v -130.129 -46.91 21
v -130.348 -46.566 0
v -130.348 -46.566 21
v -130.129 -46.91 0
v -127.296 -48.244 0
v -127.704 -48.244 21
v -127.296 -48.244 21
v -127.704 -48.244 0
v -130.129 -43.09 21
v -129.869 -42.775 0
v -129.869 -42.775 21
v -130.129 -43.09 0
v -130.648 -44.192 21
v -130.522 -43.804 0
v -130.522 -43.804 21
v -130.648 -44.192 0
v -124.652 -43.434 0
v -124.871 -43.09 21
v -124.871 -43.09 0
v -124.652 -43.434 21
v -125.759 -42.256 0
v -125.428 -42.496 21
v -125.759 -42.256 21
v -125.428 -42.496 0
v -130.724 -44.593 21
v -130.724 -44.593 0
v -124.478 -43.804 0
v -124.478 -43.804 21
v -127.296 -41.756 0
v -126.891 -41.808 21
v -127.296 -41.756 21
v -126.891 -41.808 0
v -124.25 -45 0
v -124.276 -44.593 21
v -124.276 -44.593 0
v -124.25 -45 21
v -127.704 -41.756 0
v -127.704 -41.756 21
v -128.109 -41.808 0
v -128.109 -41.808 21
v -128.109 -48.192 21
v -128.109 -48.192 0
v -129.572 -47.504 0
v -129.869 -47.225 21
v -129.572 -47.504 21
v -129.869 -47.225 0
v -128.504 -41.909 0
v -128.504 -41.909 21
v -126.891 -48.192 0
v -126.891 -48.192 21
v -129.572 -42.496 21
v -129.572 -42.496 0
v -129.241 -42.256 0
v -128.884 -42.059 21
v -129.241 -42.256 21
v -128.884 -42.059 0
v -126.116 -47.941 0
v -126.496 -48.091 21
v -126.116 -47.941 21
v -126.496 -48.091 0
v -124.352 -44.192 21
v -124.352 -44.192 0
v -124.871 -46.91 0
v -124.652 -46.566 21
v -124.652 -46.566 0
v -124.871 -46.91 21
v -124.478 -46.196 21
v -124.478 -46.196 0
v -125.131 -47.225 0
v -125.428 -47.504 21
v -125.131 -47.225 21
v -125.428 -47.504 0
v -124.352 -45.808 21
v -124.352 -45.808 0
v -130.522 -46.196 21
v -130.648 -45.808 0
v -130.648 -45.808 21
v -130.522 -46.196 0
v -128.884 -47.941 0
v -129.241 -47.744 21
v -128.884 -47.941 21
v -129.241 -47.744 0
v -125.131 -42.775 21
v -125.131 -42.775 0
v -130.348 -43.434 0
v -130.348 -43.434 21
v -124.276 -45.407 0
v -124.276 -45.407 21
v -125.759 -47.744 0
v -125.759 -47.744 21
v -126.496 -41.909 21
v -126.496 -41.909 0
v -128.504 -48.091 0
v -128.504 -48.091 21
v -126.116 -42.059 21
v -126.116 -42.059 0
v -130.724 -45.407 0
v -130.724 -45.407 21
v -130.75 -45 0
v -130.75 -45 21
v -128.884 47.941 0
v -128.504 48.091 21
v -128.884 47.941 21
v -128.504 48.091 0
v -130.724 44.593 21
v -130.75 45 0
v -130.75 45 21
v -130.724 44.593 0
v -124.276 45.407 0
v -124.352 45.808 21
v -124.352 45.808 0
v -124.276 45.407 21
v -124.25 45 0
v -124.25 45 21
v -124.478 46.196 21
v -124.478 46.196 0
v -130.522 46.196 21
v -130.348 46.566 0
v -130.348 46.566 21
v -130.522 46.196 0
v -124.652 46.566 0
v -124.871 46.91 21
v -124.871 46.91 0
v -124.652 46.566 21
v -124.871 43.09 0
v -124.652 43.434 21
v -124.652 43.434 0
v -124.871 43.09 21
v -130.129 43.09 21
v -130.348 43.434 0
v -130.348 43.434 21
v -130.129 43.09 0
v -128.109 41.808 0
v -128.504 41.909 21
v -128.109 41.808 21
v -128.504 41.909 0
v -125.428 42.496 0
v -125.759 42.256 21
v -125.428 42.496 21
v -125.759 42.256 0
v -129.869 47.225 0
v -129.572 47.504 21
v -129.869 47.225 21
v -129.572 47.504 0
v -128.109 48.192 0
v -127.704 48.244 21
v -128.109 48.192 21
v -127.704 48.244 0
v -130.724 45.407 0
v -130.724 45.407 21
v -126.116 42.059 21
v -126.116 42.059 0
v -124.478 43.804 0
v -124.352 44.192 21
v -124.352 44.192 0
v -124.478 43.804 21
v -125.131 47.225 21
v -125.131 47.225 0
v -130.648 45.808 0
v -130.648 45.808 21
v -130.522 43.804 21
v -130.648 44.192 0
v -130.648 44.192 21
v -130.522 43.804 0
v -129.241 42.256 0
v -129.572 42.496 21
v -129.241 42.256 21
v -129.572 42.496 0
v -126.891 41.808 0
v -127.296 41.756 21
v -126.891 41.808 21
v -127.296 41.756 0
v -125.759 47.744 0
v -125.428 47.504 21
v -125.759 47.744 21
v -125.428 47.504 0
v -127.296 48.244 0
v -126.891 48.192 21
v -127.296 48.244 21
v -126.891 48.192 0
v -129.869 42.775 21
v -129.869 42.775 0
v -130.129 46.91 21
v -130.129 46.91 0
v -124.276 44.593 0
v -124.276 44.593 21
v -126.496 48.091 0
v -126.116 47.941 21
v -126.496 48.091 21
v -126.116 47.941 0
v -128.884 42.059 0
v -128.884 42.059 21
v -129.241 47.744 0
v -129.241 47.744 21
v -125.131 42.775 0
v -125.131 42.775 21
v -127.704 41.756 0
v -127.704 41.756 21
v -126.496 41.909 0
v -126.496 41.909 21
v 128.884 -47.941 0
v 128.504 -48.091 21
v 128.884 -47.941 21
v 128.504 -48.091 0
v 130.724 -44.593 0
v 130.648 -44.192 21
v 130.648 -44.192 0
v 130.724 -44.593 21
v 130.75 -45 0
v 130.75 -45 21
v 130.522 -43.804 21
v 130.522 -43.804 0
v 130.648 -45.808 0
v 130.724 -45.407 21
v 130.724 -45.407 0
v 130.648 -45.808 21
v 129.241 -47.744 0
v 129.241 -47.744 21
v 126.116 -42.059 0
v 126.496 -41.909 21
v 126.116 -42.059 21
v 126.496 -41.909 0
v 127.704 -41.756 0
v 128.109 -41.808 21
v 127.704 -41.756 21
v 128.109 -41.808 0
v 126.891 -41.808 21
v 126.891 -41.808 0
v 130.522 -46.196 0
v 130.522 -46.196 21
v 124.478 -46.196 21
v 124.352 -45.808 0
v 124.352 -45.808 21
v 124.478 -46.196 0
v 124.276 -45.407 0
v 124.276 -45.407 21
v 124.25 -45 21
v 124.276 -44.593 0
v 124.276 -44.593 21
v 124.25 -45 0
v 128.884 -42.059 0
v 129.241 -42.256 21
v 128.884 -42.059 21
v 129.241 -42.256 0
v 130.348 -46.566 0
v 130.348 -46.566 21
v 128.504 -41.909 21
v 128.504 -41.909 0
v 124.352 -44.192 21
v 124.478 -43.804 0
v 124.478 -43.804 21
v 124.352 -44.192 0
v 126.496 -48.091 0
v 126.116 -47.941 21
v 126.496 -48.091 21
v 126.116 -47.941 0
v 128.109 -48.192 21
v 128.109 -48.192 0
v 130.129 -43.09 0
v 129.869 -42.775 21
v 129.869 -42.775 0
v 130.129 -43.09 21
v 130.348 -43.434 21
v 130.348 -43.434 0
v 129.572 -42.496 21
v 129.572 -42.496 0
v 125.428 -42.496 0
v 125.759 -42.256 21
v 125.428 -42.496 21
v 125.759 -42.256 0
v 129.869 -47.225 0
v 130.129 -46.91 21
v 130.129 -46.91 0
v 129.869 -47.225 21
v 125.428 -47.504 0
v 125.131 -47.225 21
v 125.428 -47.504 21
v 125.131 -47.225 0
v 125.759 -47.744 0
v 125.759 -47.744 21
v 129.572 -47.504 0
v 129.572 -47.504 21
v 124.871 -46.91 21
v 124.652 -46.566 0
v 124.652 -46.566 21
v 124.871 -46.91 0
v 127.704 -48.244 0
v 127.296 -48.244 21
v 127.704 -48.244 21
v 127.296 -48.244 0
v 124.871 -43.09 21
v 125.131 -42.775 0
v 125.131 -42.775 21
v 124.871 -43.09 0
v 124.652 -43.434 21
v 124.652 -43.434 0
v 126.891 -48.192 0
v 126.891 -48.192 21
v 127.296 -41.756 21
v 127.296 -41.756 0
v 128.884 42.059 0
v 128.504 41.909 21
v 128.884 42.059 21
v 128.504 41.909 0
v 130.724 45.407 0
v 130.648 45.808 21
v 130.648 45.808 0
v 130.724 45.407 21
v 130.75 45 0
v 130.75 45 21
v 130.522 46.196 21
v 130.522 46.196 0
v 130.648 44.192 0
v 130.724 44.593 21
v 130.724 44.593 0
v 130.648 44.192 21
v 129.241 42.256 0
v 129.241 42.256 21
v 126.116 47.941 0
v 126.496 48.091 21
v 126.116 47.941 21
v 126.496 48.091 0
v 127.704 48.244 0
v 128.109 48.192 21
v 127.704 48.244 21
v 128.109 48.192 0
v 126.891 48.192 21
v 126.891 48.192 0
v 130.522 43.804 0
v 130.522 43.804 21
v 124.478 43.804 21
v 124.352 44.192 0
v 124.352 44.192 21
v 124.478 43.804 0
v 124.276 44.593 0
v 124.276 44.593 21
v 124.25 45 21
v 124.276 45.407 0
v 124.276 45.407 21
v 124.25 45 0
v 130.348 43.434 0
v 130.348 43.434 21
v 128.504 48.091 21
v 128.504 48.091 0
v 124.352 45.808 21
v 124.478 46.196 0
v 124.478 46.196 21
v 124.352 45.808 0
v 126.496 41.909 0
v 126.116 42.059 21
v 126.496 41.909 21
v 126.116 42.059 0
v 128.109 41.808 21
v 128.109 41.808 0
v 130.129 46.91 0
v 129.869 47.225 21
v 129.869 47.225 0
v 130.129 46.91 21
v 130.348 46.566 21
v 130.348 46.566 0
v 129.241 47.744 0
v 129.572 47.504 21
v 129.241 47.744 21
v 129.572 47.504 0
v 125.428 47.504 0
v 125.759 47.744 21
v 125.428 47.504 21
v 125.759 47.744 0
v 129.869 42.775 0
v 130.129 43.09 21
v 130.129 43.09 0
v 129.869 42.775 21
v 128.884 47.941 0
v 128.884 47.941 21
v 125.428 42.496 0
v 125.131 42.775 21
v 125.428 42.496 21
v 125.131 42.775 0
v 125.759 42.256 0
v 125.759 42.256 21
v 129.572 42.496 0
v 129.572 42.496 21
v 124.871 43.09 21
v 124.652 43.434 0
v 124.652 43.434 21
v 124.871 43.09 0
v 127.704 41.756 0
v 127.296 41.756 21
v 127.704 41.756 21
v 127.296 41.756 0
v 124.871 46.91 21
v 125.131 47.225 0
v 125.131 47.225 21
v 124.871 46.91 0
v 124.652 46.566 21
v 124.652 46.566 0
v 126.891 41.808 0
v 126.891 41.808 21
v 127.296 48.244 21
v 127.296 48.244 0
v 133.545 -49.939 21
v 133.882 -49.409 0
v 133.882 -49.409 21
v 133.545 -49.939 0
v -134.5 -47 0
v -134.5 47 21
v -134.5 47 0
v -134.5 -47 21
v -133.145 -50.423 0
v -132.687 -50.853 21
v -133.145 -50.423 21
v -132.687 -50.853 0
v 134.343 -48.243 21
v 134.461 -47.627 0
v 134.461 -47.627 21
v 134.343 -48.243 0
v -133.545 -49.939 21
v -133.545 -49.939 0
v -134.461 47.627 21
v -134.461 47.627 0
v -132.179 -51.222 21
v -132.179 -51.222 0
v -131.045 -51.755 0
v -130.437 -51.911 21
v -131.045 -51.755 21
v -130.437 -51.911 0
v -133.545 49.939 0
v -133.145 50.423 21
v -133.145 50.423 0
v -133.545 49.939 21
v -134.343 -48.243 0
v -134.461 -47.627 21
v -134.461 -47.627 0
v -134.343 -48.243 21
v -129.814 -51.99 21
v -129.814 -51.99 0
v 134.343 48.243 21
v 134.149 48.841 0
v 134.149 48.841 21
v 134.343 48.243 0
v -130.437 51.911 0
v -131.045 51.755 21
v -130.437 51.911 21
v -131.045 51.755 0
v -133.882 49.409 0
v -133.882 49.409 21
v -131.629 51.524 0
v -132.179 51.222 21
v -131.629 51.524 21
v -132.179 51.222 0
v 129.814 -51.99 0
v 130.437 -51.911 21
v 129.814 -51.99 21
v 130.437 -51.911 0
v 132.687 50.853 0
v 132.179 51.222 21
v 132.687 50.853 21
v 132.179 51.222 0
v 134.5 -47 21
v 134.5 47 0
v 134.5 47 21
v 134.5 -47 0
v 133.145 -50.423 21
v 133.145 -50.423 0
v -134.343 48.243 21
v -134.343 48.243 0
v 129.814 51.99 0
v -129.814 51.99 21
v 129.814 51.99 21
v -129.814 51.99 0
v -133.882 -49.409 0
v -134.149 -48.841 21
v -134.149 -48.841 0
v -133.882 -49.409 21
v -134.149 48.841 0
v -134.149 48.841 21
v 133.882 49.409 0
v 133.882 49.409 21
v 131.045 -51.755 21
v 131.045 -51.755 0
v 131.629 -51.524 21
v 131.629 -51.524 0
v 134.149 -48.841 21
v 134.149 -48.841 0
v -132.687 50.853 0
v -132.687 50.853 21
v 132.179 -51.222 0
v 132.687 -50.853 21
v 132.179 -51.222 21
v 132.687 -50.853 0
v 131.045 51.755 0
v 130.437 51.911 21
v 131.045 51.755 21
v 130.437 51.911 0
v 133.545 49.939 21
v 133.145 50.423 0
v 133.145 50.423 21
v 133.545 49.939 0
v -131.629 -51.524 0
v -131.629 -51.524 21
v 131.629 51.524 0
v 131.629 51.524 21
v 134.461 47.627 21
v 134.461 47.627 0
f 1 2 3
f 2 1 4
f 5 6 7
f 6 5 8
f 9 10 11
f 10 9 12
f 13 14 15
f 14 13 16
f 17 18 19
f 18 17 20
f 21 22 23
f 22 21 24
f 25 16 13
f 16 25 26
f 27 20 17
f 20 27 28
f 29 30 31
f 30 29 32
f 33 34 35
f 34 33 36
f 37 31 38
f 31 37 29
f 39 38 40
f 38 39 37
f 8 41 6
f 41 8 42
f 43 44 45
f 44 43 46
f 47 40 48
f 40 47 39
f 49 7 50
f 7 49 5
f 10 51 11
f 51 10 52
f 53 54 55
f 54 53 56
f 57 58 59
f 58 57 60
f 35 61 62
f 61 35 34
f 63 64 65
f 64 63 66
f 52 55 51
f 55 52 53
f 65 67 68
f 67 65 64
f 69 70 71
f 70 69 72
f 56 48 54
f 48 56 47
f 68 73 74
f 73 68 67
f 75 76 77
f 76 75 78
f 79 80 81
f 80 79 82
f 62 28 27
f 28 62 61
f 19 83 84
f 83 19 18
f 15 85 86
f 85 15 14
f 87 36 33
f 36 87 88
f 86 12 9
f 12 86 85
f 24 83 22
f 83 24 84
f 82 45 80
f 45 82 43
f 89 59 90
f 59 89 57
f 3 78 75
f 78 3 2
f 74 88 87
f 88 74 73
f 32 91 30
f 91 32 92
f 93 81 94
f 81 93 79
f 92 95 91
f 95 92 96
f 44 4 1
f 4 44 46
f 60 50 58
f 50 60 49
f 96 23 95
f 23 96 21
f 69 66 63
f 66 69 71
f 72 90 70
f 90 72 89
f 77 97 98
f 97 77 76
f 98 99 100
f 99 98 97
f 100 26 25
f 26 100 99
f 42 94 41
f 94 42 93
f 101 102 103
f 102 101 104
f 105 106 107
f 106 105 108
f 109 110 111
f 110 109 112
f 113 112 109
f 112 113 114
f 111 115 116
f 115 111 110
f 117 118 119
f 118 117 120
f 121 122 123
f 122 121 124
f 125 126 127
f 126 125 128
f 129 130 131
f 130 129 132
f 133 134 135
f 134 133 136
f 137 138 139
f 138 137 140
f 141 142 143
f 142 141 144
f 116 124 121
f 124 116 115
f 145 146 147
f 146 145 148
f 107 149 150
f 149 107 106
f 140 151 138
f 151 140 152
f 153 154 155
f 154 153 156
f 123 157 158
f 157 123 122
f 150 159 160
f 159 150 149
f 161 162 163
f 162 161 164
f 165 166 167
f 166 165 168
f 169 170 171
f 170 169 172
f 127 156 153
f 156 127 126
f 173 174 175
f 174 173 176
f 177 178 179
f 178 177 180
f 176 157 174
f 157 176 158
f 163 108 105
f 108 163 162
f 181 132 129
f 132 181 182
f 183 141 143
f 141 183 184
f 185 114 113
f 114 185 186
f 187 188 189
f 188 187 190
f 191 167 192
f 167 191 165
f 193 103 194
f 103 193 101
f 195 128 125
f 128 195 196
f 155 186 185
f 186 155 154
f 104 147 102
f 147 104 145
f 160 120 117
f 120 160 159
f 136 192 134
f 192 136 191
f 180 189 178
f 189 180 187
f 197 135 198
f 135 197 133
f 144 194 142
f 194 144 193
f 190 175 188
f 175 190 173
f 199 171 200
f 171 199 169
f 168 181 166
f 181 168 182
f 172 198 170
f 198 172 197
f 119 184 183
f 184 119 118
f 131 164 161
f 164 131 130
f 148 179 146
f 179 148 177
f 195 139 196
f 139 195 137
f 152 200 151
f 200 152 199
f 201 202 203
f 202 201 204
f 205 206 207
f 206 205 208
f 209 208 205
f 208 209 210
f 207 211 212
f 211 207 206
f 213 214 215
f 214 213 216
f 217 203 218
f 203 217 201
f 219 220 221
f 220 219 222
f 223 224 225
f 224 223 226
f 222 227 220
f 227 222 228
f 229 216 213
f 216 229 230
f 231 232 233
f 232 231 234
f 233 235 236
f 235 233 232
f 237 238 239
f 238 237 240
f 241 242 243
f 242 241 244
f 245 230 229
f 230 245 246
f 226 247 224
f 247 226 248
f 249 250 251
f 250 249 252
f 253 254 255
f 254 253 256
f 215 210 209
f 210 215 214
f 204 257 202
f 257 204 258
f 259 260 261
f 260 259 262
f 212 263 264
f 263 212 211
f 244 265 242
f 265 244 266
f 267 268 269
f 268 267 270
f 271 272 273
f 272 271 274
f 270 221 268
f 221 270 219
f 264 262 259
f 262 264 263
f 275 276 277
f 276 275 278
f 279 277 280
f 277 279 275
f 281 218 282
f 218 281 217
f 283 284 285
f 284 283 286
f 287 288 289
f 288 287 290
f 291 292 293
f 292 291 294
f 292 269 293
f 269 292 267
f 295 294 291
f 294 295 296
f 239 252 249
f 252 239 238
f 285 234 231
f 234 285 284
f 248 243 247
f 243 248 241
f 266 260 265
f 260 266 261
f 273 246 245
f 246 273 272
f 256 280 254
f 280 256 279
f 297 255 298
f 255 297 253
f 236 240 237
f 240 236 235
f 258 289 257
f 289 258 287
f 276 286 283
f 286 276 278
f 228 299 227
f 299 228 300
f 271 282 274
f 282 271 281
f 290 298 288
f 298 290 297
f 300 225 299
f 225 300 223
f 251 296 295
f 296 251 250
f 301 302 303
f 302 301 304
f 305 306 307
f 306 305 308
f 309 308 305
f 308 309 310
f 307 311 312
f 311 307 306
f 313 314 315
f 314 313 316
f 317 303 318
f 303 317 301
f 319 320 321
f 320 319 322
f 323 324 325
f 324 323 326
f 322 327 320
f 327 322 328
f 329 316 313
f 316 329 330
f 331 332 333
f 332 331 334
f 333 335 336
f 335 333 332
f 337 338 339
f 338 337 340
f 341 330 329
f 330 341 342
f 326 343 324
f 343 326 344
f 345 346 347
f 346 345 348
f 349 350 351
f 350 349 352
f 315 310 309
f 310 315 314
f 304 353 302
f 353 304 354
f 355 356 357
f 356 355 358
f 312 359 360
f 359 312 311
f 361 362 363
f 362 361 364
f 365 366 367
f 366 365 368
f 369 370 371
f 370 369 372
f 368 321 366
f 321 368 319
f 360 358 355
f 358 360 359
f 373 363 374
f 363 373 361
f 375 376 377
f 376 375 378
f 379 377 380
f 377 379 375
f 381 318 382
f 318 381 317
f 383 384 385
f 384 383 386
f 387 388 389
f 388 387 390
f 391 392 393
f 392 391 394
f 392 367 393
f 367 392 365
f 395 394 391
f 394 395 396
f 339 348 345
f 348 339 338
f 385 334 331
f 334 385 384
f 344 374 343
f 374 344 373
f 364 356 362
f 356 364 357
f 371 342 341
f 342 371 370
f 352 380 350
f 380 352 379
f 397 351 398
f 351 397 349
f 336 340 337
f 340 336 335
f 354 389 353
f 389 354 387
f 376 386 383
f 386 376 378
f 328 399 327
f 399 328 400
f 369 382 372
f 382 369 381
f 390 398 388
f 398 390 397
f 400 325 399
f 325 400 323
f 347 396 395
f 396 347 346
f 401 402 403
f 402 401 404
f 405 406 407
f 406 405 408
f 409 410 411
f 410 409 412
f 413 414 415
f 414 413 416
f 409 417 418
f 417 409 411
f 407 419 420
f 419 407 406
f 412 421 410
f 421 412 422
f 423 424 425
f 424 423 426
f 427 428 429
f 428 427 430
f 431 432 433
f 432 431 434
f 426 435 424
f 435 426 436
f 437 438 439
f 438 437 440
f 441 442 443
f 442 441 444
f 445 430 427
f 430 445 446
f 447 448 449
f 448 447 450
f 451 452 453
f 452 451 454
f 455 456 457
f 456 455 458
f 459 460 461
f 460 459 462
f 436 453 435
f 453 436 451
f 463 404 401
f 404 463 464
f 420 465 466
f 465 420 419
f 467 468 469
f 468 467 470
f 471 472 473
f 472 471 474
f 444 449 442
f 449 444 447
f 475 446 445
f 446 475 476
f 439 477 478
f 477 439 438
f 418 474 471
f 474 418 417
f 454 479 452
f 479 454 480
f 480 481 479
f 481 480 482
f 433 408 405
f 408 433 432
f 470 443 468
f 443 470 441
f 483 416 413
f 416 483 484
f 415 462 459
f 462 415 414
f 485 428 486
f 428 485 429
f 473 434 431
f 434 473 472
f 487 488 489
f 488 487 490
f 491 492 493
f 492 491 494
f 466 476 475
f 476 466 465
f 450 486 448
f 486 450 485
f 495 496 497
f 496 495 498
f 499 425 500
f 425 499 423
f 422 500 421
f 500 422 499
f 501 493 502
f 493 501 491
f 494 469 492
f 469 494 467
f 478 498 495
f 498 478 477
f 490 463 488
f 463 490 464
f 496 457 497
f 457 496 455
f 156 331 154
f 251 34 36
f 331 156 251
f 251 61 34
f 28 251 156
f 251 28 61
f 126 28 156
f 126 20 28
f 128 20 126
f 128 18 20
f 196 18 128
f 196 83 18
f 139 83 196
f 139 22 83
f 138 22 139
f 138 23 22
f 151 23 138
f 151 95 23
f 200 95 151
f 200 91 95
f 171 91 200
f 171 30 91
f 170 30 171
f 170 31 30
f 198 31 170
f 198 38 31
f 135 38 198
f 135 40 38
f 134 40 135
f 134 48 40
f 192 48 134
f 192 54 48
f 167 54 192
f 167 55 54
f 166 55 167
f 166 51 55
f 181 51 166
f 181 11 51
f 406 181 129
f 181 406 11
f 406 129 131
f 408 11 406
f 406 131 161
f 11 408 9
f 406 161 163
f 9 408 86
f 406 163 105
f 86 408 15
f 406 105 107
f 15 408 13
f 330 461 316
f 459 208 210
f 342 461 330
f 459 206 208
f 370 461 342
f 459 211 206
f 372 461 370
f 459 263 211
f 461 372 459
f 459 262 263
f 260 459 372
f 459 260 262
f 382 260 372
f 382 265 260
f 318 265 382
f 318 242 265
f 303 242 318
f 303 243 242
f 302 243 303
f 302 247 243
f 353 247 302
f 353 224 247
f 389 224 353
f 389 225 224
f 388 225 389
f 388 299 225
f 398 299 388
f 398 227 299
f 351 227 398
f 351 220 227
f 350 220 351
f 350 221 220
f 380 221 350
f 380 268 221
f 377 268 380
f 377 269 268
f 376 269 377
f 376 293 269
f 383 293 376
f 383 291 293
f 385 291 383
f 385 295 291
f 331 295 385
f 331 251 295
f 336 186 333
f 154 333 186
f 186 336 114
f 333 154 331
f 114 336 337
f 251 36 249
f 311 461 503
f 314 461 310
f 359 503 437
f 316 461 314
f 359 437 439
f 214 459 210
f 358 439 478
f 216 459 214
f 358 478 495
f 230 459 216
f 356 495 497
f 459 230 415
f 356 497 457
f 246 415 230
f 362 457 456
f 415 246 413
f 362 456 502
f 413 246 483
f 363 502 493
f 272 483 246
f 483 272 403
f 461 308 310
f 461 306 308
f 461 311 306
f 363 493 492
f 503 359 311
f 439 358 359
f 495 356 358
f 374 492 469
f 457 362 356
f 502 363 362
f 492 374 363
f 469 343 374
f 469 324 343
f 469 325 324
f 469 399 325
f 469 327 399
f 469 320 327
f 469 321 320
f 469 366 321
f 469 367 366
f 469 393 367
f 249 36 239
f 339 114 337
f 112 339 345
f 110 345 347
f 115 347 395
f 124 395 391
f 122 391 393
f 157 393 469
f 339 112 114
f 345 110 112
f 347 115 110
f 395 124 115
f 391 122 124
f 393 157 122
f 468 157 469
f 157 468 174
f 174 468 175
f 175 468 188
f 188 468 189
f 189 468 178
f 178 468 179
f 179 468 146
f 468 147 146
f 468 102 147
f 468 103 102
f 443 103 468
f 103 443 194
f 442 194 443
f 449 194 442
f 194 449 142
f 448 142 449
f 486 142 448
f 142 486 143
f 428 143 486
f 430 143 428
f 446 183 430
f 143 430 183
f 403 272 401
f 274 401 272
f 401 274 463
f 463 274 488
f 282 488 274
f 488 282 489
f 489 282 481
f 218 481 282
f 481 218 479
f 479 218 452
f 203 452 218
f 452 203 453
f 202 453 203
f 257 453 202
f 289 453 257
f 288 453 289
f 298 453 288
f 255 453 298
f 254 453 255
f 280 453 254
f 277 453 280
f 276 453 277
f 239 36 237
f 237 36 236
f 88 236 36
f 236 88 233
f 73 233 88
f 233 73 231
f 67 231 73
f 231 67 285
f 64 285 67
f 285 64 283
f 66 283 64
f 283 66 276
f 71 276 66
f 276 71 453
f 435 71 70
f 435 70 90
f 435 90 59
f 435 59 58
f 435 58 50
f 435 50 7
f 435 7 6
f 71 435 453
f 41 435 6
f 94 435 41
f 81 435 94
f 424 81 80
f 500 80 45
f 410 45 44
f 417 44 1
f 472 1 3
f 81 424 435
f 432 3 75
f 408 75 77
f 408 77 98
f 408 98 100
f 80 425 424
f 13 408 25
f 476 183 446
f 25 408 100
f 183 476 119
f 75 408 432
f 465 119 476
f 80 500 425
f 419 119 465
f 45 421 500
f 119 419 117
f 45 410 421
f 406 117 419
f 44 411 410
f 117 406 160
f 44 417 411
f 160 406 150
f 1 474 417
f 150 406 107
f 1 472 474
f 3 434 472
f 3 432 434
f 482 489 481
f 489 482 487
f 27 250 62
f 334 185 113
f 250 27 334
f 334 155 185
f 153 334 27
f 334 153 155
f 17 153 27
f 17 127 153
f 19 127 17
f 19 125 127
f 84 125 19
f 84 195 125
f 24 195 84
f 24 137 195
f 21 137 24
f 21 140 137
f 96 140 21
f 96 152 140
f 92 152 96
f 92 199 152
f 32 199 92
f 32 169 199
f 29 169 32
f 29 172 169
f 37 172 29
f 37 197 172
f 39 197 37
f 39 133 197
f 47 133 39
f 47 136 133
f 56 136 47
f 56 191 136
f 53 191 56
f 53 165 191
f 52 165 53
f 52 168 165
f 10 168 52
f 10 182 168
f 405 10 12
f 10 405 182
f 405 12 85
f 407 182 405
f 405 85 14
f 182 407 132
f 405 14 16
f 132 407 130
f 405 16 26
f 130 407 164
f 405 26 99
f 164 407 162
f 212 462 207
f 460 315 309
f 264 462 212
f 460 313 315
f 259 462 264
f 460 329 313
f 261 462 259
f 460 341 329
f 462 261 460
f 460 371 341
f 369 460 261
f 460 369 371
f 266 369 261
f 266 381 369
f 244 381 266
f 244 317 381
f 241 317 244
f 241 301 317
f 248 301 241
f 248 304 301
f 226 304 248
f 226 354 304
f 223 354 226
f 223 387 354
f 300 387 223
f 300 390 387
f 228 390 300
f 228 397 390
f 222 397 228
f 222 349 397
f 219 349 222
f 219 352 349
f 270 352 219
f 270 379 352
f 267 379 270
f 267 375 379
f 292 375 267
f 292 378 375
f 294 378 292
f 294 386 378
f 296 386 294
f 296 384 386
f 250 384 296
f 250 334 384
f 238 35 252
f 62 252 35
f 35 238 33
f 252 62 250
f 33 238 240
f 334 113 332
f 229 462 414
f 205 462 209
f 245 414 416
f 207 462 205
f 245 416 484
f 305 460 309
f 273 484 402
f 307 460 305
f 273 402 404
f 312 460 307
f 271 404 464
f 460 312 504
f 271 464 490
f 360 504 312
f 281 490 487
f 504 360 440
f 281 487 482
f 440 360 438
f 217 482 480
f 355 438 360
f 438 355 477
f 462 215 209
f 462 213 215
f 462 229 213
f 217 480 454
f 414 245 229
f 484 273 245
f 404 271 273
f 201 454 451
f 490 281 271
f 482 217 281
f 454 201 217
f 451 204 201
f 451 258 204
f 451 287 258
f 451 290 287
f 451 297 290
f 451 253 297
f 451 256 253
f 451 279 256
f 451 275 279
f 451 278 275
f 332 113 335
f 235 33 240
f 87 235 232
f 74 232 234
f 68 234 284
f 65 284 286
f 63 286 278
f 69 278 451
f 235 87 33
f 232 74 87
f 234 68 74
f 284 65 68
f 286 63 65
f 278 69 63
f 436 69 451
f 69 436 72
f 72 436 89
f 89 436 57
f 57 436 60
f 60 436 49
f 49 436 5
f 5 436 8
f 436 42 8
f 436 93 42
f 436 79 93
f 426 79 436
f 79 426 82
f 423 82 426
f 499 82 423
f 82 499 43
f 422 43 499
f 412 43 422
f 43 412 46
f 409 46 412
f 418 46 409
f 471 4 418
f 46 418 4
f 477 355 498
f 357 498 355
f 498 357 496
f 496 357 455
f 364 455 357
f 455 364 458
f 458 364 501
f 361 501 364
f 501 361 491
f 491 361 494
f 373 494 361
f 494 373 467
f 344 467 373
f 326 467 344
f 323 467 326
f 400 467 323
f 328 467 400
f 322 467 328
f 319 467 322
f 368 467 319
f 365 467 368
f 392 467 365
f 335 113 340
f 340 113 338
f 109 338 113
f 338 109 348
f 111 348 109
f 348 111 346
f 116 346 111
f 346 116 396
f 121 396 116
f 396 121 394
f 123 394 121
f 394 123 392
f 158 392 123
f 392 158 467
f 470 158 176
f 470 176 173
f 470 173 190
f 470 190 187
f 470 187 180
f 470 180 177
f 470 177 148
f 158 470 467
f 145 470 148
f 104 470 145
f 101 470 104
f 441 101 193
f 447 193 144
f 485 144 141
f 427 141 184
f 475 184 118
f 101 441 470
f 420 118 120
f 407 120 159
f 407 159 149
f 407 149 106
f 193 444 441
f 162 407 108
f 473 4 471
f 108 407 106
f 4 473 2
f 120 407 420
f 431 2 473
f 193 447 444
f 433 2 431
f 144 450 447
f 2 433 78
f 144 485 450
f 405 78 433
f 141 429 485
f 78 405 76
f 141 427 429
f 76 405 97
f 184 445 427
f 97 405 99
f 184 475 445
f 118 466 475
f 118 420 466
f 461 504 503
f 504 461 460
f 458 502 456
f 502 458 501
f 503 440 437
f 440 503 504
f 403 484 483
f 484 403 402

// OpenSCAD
$fn = 50;


difference() {
	union() {
		hull() {
			translate(v = [-129.5000000000, 47.0000000000, 0]) {
				cylinder(h = 21, r = 5);
			}
			translate(v = [129.5000000000, 47.0000000000, 0]) {
				cylinder(h = 21, r = 5);
			}
			translate(v = [-129.5000000000, -47.0000000000, 0]) {
				cylinder(h = 21, r = 5);
			}
			translate(v = [129.5000000000, -47.0000000000, 0]) {
				cylinder(h = 21, r = 5);
			}
		}
	}
	union() {
		translate(v = [-127.5000000000, -45.0000000000, -100.0000000000]) {
			cylinder(h = 200, r = 3.2500000000);
		}
		translate(v = [-127.5000000000, 45.0000000000, -100.0000000000]) {
			cylinder(h = 200, r = 3.2500000000);
		}
		translate(v = [127.5000000000, -45.0000000000, -100.0000000000]) {
			cylinder(h = 200, r = 3.2500000000);
		}
		translate(v = [127.5000000000, 45.0000000000, -100.0000000000]) {
			cylinder(h = 200, r = 3.2500000000);
		}
	}
}
